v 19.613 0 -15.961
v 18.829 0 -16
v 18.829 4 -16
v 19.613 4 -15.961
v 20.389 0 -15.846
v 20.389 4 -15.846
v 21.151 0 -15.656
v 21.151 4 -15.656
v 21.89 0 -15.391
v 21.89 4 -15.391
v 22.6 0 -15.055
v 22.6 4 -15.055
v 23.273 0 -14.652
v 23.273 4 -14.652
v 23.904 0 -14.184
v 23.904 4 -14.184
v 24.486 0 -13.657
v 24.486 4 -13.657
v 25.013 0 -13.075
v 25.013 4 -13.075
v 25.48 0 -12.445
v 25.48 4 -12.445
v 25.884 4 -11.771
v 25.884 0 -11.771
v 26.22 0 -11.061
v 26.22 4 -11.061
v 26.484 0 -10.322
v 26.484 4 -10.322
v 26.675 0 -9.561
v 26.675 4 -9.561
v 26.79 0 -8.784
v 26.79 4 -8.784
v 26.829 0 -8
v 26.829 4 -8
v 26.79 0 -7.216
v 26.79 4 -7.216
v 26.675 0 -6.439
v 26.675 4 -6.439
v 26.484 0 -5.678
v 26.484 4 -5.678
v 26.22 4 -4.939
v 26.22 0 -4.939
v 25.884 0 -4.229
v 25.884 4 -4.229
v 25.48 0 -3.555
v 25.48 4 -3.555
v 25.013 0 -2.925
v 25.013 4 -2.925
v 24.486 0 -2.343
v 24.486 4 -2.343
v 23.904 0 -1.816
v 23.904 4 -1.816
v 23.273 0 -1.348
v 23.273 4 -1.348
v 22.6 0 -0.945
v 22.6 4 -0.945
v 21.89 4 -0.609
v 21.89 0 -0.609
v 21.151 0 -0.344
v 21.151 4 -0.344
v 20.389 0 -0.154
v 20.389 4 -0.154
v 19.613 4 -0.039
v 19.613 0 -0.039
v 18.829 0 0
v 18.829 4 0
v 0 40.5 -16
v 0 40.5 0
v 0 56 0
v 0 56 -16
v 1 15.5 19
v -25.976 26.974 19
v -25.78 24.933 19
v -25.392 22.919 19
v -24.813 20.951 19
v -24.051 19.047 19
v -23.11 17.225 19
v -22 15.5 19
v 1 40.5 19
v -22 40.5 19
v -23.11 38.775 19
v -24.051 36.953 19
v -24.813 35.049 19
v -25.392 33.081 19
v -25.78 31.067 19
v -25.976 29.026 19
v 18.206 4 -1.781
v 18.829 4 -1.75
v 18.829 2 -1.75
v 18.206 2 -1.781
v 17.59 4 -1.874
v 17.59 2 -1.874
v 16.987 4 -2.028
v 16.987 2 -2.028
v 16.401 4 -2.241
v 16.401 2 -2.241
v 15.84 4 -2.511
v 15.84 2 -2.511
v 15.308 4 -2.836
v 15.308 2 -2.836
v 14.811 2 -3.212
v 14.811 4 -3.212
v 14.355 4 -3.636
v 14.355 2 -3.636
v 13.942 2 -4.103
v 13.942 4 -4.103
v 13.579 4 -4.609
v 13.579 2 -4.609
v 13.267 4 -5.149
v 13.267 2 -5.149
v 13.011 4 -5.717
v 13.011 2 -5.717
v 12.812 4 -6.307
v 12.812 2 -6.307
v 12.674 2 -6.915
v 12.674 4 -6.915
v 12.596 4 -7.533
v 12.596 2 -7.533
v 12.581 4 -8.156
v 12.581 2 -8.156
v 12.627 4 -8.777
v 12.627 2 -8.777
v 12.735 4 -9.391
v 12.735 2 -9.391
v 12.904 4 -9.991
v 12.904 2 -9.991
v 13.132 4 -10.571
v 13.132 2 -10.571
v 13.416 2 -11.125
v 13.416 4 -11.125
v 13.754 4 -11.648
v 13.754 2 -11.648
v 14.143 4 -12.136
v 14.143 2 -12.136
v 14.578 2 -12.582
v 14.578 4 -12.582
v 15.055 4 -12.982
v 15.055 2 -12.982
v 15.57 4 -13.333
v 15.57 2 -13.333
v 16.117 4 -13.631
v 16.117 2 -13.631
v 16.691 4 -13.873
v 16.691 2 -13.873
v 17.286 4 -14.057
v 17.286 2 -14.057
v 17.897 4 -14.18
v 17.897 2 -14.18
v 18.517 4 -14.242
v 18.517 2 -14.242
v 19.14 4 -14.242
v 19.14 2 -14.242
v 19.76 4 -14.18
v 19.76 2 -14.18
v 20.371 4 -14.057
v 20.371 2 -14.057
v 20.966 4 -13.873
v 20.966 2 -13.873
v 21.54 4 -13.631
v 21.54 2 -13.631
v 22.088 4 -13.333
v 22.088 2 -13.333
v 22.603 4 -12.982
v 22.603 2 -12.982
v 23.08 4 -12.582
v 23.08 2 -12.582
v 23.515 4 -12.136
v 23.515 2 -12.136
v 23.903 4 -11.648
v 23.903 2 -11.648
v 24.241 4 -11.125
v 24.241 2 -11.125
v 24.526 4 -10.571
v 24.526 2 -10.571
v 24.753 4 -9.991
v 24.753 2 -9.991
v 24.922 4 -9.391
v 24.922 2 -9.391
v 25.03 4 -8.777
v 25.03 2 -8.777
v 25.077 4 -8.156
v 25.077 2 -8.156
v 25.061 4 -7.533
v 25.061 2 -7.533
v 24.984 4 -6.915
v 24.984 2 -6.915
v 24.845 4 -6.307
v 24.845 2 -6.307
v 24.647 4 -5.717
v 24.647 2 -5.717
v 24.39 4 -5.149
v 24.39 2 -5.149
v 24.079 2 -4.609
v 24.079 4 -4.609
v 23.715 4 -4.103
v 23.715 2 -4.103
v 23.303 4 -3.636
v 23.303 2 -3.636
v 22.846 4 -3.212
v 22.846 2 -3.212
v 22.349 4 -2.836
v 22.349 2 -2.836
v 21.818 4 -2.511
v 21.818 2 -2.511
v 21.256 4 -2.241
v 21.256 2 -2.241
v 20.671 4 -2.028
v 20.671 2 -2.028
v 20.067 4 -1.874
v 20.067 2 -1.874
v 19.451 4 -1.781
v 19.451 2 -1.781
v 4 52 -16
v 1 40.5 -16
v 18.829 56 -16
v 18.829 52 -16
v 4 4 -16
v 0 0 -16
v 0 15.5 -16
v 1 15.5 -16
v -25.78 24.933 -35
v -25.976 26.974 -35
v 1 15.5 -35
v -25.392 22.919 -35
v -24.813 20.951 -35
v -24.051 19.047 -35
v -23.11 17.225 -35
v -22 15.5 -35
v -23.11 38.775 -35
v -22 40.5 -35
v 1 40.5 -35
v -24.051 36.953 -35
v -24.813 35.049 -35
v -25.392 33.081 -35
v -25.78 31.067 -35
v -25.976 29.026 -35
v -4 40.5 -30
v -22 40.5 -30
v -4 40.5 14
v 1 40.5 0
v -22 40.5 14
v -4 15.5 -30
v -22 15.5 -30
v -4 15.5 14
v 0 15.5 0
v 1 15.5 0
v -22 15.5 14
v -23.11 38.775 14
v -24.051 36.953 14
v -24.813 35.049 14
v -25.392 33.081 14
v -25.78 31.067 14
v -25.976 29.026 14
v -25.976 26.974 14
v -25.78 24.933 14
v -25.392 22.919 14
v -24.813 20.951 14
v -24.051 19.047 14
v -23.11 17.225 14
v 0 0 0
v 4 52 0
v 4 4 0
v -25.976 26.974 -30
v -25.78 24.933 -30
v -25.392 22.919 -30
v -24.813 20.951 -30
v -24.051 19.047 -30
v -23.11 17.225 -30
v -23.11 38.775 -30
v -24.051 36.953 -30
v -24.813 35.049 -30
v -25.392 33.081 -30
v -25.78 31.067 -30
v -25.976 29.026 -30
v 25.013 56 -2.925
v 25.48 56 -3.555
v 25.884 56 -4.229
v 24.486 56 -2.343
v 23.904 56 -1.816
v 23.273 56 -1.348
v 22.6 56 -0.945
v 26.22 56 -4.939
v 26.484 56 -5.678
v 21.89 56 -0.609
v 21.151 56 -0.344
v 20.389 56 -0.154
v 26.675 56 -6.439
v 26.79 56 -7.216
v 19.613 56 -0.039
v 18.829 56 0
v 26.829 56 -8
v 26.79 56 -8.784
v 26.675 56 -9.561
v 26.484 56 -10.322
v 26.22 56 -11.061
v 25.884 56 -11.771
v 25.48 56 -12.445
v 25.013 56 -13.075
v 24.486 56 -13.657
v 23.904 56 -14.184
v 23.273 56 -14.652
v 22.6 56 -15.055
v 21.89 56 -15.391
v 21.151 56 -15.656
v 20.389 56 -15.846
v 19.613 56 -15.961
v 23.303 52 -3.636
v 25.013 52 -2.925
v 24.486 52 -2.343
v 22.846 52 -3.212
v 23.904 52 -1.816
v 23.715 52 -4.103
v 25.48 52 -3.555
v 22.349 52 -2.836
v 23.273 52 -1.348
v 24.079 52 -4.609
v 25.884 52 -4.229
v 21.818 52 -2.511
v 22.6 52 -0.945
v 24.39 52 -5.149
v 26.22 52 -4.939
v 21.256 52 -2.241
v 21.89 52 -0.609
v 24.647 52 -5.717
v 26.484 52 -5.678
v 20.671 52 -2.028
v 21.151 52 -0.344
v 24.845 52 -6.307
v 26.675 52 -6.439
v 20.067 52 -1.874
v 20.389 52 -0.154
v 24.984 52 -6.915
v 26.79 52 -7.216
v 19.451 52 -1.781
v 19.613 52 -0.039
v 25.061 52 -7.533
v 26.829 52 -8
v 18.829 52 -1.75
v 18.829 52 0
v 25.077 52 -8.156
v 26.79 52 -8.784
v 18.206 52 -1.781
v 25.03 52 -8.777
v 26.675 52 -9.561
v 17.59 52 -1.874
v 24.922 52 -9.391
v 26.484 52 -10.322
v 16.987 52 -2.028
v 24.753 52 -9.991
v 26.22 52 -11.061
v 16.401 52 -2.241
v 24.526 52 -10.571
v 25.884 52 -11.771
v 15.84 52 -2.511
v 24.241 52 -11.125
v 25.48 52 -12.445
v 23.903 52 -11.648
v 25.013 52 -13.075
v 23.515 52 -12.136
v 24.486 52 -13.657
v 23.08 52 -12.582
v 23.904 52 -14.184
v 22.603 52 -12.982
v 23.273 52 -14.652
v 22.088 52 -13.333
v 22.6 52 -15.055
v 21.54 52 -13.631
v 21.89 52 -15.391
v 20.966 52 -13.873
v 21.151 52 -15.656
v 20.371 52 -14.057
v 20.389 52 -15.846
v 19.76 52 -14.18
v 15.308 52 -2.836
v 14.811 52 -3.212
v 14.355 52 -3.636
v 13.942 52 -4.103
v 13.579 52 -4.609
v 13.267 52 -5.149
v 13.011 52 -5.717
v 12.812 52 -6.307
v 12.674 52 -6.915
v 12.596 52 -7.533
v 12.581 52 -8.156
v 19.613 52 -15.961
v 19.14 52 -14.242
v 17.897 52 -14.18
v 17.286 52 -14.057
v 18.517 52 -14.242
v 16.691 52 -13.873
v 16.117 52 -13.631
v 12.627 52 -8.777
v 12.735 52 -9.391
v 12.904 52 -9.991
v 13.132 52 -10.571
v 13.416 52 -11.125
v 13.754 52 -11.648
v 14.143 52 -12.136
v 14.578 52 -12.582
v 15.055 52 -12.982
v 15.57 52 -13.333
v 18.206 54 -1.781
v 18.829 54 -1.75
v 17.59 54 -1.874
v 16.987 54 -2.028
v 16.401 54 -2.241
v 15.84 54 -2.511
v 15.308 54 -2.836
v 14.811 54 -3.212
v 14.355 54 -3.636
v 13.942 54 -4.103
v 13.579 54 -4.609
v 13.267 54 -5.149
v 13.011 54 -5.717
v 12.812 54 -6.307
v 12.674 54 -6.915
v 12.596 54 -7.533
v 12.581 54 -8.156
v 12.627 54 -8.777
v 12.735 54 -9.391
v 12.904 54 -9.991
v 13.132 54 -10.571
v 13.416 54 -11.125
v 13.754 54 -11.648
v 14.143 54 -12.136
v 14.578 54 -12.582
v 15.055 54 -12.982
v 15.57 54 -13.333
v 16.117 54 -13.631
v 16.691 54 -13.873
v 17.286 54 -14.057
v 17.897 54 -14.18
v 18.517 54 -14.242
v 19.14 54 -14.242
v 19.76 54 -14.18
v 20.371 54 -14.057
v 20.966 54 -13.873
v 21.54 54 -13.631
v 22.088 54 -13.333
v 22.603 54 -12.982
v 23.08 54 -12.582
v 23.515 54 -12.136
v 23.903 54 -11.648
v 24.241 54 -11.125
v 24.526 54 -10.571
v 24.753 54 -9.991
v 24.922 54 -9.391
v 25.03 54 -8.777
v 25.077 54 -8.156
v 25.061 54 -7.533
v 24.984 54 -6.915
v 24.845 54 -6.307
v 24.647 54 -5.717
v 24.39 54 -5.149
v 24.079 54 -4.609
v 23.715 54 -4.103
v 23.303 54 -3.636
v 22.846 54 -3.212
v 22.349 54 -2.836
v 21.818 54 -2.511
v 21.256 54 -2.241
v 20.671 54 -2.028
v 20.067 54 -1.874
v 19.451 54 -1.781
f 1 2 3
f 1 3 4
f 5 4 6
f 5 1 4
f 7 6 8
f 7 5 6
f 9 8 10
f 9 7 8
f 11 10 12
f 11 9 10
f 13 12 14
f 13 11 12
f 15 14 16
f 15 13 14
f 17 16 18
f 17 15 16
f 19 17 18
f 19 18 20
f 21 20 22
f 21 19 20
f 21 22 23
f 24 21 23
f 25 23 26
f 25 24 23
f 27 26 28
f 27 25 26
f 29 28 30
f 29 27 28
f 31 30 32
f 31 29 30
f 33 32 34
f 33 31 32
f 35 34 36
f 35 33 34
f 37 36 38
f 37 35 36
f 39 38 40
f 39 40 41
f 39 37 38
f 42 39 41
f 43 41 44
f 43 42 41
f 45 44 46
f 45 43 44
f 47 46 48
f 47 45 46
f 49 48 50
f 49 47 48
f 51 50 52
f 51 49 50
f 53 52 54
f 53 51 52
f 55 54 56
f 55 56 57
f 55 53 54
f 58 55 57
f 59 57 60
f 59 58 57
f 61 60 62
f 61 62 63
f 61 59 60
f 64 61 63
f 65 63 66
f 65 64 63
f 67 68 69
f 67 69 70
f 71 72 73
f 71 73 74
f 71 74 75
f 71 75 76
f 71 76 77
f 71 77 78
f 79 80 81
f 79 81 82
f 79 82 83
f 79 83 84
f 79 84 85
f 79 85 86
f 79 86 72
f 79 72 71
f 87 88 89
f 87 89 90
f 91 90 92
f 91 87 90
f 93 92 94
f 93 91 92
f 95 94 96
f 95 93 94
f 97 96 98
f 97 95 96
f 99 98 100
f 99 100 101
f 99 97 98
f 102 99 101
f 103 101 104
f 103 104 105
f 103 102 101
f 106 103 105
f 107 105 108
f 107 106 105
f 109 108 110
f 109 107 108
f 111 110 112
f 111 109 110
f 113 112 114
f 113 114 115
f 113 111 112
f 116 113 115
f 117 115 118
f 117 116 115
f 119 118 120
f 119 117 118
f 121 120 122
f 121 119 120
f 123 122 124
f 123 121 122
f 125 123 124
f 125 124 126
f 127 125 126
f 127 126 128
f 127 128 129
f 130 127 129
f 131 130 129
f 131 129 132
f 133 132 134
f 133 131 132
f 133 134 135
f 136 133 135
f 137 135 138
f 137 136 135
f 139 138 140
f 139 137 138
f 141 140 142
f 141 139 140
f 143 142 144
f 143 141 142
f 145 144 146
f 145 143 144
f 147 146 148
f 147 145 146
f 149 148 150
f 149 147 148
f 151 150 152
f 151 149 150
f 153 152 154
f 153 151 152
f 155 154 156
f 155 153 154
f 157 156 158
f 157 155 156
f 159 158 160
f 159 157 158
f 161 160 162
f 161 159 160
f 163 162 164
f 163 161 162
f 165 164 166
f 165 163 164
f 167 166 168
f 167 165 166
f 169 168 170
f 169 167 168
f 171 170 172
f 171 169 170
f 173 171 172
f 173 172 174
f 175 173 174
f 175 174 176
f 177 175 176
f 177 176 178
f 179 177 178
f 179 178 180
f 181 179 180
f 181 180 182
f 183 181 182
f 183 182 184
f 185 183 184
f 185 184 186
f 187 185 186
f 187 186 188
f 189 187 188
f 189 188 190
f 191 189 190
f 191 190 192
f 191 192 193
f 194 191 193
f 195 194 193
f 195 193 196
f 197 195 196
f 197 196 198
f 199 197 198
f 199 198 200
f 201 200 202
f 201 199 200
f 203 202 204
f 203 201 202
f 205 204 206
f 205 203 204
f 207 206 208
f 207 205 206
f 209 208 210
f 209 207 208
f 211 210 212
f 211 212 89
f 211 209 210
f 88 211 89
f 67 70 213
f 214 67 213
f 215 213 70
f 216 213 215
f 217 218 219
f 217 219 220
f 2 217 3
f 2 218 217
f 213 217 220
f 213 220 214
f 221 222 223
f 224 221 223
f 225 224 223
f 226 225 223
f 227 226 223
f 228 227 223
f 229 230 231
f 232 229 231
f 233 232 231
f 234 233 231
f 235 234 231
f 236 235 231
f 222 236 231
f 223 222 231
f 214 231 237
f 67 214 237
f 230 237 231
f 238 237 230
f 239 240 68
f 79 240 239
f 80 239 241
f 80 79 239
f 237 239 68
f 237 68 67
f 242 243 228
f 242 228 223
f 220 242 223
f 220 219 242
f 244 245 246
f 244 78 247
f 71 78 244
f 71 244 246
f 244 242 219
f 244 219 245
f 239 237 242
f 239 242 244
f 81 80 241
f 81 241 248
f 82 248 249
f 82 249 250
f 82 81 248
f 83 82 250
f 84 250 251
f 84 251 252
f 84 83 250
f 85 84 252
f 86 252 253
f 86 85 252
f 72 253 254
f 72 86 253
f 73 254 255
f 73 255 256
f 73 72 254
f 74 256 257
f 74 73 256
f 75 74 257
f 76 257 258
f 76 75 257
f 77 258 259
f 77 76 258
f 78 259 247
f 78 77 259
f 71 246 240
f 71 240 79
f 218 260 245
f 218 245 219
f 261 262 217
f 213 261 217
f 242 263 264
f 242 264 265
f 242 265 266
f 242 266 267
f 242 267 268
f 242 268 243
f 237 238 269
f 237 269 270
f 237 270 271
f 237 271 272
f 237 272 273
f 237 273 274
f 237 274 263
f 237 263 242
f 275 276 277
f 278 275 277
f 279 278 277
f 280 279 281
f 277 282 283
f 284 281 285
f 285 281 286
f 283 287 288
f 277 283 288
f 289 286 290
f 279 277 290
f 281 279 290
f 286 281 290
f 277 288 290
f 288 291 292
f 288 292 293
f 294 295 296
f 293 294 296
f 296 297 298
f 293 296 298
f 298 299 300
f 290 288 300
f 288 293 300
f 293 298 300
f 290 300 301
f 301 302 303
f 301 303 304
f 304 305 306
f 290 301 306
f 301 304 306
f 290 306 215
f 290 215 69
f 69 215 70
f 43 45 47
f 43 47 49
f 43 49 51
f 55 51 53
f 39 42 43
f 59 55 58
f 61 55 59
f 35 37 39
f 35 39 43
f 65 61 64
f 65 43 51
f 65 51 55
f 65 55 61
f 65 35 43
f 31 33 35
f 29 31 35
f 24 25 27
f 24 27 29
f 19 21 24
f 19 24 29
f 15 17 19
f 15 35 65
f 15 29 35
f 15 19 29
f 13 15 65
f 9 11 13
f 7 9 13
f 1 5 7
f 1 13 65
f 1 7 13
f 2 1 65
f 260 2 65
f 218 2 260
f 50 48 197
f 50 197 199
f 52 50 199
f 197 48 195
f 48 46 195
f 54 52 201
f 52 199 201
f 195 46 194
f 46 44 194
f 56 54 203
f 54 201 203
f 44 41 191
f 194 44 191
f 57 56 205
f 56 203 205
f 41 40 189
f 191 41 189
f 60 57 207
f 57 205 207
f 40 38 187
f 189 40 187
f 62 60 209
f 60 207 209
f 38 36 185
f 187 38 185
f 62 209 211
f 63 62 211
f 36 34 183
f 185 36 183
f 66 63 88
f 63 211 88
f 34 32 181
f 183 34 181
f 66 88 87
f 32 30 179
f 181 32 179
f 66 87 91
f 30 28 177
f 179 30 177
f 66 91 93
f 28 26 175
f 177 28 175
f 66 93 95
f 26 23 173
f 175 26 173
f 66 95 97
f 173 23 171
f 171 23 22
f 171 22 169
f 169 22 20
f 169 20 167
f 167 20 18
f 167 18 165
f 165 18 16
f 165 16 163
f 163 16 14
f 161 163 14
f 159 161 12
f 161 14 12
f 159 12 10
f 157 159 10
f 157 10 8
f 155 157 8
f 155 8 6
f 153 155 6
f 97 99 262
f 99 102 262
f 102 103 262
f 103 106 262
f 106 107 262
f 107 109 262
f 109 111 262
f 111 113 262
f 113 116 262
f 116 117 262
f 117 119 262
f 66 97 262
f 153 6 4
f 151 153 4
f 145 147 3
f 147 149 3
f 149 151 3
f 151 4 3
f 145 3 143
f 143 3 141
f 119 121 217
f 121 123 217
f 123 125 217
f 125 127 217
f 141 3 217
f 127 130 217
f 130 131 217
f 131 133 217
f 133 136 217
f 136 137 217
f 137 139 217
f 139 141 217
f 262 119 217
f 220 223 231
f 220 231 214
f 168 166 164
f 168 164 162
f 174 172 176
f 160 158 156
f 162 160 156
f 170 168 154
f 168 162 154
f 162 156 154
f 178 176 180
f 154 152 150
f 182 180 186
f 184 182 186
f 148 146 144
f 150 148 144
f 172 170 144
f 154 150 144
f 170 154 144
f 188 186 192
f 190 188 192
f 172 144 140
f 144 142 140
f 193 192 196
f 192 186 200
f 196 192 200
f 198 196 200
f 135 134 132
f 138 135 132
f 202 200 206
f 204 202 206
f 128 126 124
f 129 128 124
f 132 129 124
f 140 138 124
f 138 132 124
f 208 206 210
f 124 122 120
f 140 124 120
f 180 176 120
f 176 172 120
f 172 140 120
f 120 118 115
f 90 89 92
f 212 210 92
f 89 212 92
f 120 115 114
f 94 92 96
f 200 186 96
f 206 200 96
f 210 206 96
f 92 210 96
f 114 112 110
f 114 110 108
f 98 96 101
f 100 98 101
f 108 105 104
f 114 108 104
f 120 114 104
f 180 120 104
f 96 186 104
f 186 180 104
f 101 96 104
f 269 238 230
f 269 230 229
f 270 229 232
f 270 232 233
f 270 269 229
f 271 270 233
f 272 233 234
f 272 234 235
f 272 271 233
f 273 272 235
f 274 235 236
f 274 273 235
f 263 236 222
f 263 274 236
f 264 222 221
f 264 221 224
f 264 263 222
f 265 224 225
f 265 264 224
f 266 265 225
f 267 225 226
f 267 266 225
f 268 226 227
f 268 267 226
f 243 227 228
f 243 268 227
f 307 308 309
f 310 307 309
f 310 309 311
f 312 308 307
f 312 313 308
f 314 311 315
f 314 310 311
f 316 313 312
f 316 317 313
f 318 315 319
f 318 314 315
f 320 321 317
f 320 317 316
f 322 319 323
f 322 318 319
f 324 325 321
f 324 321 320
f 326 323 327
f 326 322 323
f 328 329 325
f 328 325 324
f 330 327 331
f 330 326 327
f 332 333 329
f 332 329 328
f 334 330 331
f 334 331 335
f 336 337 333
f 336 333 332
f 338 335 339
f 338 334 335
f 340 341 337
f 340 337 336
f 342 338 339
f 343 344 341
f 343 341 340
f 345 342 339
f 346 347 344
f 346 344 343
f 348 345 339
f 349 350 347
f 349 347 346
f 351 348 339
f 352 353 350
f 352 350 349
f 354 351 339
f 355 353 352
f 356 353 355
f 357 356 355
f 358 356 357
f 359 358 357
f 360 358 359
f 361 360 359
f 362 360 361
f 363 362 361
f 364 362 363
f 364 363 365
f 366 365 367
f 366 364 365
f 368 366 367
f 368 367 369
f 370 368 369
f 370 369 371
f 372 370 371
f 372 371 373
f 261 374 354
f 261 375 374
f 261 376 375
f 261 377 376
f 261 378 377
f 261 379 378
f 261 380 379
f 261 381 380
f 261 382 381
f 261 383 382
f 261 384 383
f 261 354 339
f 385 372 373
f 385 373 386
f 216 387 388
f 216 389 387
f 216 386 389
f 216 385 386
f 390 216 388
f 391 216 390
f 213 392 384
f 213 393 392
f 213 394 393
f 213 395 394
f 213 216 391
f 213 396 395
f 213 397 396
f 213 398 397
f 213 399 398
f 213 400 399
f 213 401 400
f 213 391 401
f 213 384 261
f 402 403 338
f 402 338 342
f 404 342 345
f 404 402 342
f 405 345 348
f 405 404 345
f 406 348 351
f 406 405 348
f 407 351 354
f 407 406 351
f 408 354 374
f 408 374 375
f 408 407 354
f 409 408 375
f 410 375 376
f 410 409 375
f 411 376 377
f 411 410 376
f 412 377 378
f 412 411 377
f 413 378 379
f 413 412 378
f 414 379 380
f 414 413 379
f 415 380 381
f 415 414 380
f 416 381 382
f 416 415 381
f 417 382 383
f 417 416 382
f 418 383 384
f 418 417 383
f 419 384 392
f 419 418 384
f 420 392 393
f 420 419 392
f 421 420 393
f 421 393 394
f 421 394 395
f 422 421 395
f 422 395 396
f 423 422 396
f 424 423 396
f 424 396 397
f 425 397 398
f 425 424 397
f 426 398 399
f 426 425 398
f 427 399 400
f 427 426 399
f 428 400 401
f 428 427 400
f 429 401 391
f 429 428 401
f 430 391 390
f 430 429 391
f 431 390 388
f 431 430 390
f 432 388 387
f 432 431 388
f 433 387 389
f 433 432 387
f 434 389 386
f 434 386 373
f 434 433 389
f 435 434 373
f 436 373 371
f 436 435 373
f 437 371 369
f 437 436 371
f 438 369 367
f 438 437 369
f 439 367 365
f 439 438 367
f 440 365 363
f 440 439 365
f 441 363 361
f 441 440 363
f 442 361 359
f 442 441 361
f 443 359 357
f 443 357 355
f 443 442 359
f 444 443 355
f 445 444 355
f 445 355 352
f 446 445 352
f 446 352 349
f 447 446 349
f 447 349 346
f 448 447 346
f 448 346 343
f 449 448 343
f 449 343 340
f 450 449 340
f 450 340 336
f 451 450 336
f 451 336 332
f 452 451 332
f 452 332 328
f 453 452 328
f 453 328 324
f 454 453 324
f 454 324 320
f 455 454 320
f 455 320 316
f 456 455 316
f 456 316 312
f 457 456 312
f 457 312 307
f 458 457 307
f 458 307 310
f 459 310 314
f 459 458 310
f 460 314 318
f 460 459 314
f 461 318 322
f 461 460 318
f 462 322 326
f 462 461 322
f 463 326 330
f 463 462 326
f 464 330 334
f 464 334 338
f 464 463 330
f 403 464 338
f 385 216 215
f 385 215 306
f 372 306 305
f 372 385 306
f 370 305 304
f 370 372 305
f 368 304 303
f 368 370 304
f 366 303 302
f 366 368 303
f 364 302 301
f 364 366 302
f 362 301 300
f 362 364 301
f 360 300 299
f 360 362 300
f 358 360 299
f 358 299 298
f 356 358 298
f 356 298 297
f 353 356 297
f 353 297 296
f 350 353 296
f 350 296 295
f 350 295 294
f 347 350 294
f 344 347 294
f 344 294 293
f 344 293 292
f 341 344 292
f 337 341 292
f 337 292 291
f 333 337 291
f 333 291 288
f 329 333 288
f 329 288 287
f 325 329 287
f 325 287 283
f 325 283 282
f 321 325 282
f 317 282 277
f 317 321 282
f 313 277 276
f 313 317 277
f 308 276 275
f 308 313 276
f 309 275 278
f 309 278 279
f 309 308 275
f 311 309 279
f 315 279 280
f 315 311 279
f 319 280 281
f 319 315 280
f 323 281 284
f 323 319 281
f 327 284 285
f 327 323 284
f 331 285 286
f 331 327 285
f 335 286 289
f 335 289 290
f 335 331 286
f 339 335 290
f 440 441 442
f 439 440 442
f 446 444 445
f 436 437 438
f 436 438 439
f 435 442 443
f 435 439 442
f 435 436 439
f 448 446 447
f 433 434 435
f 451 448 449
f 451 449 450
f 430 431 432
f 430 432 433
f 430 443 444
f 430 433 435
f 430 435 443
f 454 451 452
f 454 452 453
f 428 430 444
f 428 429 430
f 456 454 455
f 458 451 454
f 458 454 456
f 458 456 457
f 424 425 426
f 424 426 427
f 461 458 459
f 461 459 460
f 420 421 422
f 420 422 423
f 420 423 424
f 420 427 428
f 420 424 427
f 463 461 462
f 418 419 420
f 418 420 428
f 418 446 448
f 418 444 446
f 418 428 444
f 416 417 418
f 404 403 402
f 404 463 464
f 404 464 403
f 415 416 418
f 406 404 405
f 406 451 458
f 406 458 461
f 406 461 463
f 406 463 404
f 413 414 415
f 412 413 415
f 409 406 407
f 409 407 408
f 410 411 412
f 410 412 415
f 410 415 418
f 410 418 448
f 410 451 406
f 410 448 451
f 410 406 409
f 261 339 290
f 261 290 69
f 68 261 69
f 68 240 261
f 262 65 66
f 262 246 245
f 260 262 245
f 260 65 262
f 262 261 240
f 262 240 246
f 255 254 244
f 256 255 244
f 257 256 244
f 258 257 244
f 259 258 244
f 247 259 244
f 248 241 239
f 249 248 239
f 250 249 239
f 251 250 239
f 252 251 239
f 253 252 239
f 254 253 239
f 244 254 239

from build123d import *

# Parameters (mm, degrees)
BOSS_EXTRUDE1_DEPTH      = 56
SHELL1_T                 = -4
CUT_EXTRUDE1_START       = -4
SKETCH2_R                = 6.25
CUT_EXTRUDE1_DEPTH       = 2
CUT_EXTRUDE2_START       = -54
SKETCH2_2_R              = 6.25
CUT_EXTRUDE2_DEPTH       = 2
BOSS_EXTRUDE2_DEPTH      = 4
BOSS_EXTRUDE2_DEPTH_BACK = 1
SKETCH3_W                = 54
SKETCH3_H                = 25
BOSS_EXTRUDE3_DEPTH      = 5
BOSS_EXTRUDE4_START      = -49
BOSS_EXTRUDE4_DEPTH      = 5


with BuildPart() as part:
    # Sketch1 → Boss-Extrude1 (new body)
    with BuildSketch(Plane(origin=(0, 0, 0), x_dir=(1, 0, 0), z_dir=(0, 1, 0))):
        with BuildLine():
            Line((0, 0), (0, 16))
            Line((0, 16), (18.828724193, 16))
            ThreePointArc((18.828724193, 16), (26.828724193, 8), (18.828724193, 0))
            Line((18.828724193, 0), (0, 0))
        make_face()
    extrude(amount=BOSS_EXTRUDE1_DEPTH)

    # Shell1
    shell1_openings = [part.faces().sort_by_distance(p)[0] for p in [
        (9.414362096, 28, 0),
        (9.414362096, 28, -16),
        (26.828724193, 28, -8),
    ]]
    offset(amount=SHELL1_T, openings=shell1_openings, kind=Kind.INTERSECTION)

    # Sketch2 → Cut-Extrude1 (cut)
    with BuildSketch(Plane.XZ.offset(CUT_EXTRUDE1_START)):
        with Locations(Location((18.828724193, -8, 0), (0, 0, 90))):
            Circle(SKETCH2_R)
    extrude(amount=CUT_EXTRUDE1_DEPTH, mode=Mode.SUBTRACT)

    # Sketch2<2> → Cut-Extrude2 (cut)
    with BuildSketch(Plane.XZ.offset(CUT_EXTRUDE2_START)):
        with Locations(Location((18.828724193, -8, 0), (0, 0, 90))):
            Circle(SKETCH2_2_R)
    extrude(amount=CUT_EXTRUDE2_DEPTH, mode=Mode.SUBTRACT)

    # Sketch3 → Boss-Extrude2 (add, two sides: drawn at the far end of the back side and taken through both)
    with BuildSketch(Plane.ZY.offset(-BOSS_EXTRUDE2_DEPTH_BACK)):
        with Locations((-8, 28)):
            Rectangle(SKETCH3_W, SKETCH3_H)
    extrude(amount=BOSS_EXTRUDE2_DEPTH + BOSS_EXTRUDE2_DEPTH_BACK)

    # Sketch4 → Boss-Extrude3 (add)
    with BuildSketch(Plane.XY.offset(19)):
        with BuildLine():
            Line((-4, 15.5), (-4, 40.5))
            Line((-4, 40.5), (-22, 40.5))
            ThreePointArc((-22, 40.5), (-26, 28), (-22, 15.5))
            Line((-22, 15.5), (-4, 15.5))
        make_face()
    extrude(amount=-BOSS_EXTRUDE3_DEPTH)

    # Sketch4<4> → Boss-Extrude4 (add)
    with BuildSketch(Plane.XY.offset(19).offset(BOSS_EXTRUDE4_START)):
        with BuildLine():
            Line((-4, 15.5), (-4, 40.5))
            Line((-4, 40.5), (-22, 40.5))
            ThreePointArc((-22, 40.5), (-26, 28), (-22, 15.5))
            Line((-22, 15.5), (-4, 15.5))
        make_face()
    extrude(amount=-BOSS_EXTRUDE4_DEPTH)


solid = part.part
